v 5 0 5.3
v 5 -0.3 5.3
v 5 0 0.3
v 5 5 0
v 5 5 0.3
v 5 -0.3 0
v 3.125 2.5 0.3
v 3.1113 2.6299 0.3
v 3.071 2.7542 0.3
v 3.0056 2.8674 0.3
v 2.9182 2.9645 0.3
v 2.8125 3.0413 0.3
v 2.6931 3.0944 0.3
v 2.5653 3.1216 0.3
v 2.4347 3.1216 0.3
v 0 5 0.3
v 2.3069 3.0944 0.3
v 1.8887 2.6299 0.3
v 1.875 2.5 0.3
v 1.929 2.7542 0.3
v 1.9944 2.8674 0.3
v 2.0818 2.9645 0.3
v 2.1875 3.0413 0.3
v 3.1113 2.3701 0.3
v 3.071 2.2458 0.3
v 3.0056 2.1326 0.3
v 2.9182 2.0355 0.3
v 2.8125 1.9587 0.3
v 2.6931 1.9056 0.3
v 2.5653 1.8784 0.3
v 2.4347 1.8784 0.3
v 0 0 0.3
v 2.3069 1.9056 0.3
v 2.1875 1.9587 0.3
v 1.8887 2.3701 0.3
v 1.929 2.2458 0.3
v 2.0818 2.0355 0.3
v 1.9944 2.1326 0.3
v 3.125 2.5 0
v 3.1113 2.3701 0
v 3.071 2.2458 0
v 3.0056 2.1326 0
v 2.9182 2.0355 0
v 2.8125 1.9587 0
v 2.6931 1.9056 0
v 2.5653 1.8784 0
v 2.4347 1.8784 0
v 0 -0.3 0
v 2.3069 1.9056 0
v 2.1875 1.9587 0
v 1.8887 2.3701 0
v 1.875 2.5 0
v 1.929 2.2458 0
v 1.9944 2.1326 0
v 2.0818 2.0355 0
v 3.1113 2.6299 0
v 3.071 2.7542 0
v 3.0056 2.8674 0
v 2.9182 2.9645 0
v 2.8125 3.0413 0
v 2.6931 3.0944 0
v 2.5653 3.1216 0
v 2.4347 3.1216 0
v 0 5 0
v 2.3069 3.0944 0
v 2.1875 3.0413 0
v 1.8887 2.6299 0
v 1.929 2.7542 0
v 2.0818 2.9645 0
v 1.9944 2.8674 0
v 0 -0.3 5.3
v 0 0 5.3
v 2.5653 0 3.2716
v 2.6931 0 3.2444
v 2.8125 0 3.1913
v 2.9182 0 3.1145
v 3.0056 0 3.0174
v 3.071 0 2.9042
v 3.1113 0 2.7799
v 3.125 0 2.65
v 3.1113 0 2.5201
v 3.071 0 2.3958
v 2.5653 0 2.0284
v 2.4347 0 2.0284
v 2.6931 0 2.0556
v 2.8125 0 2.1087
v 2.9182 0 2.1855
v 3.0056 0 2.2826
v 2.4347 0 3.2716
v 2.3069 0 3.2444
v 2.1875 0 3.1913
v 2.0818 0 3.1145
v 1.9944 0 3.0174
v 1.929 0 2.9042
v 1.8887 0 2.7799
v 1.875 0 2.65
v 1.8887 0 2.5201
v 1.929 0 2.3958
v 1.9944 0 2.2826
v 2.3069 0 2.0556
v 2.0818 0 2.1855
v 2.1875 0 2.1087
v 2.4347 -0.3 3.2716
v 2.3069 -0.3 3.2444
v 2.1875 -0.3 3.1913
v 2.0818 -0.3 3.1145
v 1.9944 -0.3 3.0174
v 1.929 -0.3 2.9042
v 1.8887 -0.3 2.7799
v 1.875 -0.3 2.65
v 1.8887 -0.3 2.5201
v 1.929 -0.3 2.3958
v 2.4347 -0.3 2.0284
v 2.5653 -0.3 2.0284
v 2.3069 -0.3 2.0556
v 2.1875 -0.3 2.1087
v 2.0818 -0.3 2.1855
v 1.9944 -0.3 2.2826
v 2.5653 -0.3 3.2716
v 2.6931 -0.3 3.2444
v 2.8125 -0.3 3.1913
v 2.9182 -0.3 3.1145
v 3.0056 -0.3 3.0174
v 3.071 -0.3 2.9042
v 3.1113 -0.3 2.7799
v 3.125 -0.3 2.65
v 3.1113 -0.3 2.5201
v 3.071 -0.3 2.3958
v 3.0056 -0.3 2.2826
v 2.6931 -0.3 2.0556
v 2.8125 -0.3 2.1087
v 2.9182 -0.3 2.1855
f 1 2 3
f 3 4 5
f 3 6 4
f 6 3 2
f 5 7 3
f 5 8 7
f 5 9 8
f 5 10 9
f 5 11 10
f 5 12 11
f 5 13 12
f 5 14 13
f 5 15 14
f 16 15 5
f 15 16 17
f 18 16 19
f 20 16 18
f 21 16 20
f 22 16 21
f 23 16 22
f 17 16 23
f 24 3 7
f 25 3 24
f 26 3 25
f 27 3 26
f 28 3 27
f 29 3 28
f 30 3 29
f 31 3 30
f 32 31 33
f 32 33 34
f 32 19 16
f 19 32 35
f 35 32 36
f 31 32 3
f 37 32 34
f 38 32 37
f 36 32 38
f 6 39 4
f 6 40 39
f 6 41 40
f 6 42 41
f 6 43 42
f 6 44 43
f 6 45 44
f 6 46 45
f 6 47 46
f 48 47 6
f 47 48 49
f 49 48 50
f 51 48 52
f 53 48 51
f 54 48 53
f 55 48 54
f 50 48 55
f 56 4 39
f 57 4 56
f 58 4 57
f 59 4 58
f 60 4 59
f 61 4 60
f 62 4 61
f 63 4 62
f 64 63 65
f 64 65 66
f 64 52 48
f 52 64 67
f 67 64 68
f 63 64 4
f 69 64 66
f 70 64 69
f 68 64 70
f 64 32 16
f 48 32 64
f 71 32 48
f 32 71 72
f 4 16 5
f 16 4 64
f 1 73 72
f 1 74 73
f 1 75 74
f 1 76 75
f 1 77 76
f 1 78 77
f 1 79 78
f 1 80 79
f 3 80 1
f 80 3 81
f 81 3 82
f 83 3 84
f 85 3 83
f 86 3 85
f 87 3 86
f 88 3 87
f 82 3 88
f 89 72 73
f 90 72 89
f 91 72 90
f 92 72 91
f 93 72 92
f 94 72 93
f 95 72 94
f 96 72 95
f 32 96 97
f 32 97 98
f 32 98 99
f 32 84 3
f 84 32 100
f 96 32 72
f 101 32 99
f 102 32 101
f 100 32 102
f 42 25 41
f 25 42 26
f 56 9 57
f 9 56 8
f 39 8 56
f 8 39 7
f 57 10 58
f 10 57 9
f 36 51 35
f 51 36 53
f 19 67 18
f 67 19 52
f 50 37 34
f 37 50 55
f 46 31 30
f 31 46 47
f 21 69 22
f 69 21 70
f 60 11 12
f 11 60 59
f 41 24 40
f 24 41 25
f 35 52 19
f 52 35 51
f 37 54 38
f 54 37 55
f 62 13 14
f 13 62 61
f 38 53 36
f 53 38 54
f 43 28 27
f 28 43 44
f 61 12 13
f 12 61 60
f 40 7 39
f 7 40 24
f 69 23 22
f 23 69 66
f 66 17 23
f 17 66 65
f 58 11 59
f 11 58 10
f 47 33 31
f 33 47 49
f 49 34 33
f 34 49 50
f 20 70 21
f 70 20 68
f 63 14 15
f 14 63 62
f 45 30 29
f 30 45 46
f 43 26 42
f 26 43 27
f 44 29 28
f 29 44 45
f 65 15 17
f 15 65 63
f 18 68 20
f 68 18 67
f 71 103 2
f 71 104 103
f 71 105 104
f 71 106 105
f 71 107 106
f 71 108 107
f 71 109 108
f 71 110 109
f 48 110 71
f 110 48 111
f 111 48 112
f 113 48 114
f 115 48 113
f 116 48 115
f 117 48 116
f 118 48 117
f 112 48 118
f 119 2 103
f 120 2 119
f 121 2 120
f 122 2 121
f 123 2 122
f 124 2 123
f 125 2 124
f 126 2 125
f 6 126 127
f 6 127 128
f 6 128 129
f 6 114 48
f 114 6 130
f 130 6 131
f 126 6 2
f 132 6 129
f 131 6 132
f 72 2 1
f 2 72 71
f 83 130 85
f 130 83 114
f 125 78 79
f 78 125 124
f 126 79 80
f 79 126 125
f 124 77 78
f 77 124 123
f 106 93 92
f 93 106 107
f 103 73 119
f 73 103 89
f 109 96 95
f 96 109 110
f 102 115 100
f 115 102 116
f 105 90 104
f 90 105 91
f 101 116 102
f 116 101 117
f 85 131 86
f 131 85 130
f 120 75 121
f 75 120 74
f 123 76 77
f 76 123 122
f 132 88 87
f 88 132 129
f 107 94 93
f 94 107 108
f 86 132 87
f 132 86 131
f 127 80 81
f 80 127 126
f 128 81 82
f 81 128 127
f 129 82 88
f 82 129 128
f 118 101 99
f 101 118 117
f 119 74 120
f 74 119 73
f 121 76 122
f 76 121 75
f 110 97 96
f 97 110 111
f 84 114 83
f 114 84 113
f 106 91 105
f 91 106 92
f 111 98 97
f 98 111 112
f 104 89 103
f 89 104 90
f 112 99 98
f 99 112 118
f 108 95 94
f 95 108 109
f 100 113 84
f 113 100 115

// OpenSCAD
$fn = 30;

module plate(length, width, thickness) {
    difference() {
        cube([length,width,thickness]);
        translate([length/2, width/2, 0]) {
            cylinder(r=min(length,width)/8,h=thickness);
        }
    }
}

module bracket(length, width, thickness) {
plate(length,width,thickness);
rotate(a=90, v = [1,0,0]) plate(length,width+thickness,thickness);
}

bracket(5,5,0.3);

/*
for(i= [0: 1.5: 10])
    translate([0,0,i]) {plate(5,2,0.2);}
*/
